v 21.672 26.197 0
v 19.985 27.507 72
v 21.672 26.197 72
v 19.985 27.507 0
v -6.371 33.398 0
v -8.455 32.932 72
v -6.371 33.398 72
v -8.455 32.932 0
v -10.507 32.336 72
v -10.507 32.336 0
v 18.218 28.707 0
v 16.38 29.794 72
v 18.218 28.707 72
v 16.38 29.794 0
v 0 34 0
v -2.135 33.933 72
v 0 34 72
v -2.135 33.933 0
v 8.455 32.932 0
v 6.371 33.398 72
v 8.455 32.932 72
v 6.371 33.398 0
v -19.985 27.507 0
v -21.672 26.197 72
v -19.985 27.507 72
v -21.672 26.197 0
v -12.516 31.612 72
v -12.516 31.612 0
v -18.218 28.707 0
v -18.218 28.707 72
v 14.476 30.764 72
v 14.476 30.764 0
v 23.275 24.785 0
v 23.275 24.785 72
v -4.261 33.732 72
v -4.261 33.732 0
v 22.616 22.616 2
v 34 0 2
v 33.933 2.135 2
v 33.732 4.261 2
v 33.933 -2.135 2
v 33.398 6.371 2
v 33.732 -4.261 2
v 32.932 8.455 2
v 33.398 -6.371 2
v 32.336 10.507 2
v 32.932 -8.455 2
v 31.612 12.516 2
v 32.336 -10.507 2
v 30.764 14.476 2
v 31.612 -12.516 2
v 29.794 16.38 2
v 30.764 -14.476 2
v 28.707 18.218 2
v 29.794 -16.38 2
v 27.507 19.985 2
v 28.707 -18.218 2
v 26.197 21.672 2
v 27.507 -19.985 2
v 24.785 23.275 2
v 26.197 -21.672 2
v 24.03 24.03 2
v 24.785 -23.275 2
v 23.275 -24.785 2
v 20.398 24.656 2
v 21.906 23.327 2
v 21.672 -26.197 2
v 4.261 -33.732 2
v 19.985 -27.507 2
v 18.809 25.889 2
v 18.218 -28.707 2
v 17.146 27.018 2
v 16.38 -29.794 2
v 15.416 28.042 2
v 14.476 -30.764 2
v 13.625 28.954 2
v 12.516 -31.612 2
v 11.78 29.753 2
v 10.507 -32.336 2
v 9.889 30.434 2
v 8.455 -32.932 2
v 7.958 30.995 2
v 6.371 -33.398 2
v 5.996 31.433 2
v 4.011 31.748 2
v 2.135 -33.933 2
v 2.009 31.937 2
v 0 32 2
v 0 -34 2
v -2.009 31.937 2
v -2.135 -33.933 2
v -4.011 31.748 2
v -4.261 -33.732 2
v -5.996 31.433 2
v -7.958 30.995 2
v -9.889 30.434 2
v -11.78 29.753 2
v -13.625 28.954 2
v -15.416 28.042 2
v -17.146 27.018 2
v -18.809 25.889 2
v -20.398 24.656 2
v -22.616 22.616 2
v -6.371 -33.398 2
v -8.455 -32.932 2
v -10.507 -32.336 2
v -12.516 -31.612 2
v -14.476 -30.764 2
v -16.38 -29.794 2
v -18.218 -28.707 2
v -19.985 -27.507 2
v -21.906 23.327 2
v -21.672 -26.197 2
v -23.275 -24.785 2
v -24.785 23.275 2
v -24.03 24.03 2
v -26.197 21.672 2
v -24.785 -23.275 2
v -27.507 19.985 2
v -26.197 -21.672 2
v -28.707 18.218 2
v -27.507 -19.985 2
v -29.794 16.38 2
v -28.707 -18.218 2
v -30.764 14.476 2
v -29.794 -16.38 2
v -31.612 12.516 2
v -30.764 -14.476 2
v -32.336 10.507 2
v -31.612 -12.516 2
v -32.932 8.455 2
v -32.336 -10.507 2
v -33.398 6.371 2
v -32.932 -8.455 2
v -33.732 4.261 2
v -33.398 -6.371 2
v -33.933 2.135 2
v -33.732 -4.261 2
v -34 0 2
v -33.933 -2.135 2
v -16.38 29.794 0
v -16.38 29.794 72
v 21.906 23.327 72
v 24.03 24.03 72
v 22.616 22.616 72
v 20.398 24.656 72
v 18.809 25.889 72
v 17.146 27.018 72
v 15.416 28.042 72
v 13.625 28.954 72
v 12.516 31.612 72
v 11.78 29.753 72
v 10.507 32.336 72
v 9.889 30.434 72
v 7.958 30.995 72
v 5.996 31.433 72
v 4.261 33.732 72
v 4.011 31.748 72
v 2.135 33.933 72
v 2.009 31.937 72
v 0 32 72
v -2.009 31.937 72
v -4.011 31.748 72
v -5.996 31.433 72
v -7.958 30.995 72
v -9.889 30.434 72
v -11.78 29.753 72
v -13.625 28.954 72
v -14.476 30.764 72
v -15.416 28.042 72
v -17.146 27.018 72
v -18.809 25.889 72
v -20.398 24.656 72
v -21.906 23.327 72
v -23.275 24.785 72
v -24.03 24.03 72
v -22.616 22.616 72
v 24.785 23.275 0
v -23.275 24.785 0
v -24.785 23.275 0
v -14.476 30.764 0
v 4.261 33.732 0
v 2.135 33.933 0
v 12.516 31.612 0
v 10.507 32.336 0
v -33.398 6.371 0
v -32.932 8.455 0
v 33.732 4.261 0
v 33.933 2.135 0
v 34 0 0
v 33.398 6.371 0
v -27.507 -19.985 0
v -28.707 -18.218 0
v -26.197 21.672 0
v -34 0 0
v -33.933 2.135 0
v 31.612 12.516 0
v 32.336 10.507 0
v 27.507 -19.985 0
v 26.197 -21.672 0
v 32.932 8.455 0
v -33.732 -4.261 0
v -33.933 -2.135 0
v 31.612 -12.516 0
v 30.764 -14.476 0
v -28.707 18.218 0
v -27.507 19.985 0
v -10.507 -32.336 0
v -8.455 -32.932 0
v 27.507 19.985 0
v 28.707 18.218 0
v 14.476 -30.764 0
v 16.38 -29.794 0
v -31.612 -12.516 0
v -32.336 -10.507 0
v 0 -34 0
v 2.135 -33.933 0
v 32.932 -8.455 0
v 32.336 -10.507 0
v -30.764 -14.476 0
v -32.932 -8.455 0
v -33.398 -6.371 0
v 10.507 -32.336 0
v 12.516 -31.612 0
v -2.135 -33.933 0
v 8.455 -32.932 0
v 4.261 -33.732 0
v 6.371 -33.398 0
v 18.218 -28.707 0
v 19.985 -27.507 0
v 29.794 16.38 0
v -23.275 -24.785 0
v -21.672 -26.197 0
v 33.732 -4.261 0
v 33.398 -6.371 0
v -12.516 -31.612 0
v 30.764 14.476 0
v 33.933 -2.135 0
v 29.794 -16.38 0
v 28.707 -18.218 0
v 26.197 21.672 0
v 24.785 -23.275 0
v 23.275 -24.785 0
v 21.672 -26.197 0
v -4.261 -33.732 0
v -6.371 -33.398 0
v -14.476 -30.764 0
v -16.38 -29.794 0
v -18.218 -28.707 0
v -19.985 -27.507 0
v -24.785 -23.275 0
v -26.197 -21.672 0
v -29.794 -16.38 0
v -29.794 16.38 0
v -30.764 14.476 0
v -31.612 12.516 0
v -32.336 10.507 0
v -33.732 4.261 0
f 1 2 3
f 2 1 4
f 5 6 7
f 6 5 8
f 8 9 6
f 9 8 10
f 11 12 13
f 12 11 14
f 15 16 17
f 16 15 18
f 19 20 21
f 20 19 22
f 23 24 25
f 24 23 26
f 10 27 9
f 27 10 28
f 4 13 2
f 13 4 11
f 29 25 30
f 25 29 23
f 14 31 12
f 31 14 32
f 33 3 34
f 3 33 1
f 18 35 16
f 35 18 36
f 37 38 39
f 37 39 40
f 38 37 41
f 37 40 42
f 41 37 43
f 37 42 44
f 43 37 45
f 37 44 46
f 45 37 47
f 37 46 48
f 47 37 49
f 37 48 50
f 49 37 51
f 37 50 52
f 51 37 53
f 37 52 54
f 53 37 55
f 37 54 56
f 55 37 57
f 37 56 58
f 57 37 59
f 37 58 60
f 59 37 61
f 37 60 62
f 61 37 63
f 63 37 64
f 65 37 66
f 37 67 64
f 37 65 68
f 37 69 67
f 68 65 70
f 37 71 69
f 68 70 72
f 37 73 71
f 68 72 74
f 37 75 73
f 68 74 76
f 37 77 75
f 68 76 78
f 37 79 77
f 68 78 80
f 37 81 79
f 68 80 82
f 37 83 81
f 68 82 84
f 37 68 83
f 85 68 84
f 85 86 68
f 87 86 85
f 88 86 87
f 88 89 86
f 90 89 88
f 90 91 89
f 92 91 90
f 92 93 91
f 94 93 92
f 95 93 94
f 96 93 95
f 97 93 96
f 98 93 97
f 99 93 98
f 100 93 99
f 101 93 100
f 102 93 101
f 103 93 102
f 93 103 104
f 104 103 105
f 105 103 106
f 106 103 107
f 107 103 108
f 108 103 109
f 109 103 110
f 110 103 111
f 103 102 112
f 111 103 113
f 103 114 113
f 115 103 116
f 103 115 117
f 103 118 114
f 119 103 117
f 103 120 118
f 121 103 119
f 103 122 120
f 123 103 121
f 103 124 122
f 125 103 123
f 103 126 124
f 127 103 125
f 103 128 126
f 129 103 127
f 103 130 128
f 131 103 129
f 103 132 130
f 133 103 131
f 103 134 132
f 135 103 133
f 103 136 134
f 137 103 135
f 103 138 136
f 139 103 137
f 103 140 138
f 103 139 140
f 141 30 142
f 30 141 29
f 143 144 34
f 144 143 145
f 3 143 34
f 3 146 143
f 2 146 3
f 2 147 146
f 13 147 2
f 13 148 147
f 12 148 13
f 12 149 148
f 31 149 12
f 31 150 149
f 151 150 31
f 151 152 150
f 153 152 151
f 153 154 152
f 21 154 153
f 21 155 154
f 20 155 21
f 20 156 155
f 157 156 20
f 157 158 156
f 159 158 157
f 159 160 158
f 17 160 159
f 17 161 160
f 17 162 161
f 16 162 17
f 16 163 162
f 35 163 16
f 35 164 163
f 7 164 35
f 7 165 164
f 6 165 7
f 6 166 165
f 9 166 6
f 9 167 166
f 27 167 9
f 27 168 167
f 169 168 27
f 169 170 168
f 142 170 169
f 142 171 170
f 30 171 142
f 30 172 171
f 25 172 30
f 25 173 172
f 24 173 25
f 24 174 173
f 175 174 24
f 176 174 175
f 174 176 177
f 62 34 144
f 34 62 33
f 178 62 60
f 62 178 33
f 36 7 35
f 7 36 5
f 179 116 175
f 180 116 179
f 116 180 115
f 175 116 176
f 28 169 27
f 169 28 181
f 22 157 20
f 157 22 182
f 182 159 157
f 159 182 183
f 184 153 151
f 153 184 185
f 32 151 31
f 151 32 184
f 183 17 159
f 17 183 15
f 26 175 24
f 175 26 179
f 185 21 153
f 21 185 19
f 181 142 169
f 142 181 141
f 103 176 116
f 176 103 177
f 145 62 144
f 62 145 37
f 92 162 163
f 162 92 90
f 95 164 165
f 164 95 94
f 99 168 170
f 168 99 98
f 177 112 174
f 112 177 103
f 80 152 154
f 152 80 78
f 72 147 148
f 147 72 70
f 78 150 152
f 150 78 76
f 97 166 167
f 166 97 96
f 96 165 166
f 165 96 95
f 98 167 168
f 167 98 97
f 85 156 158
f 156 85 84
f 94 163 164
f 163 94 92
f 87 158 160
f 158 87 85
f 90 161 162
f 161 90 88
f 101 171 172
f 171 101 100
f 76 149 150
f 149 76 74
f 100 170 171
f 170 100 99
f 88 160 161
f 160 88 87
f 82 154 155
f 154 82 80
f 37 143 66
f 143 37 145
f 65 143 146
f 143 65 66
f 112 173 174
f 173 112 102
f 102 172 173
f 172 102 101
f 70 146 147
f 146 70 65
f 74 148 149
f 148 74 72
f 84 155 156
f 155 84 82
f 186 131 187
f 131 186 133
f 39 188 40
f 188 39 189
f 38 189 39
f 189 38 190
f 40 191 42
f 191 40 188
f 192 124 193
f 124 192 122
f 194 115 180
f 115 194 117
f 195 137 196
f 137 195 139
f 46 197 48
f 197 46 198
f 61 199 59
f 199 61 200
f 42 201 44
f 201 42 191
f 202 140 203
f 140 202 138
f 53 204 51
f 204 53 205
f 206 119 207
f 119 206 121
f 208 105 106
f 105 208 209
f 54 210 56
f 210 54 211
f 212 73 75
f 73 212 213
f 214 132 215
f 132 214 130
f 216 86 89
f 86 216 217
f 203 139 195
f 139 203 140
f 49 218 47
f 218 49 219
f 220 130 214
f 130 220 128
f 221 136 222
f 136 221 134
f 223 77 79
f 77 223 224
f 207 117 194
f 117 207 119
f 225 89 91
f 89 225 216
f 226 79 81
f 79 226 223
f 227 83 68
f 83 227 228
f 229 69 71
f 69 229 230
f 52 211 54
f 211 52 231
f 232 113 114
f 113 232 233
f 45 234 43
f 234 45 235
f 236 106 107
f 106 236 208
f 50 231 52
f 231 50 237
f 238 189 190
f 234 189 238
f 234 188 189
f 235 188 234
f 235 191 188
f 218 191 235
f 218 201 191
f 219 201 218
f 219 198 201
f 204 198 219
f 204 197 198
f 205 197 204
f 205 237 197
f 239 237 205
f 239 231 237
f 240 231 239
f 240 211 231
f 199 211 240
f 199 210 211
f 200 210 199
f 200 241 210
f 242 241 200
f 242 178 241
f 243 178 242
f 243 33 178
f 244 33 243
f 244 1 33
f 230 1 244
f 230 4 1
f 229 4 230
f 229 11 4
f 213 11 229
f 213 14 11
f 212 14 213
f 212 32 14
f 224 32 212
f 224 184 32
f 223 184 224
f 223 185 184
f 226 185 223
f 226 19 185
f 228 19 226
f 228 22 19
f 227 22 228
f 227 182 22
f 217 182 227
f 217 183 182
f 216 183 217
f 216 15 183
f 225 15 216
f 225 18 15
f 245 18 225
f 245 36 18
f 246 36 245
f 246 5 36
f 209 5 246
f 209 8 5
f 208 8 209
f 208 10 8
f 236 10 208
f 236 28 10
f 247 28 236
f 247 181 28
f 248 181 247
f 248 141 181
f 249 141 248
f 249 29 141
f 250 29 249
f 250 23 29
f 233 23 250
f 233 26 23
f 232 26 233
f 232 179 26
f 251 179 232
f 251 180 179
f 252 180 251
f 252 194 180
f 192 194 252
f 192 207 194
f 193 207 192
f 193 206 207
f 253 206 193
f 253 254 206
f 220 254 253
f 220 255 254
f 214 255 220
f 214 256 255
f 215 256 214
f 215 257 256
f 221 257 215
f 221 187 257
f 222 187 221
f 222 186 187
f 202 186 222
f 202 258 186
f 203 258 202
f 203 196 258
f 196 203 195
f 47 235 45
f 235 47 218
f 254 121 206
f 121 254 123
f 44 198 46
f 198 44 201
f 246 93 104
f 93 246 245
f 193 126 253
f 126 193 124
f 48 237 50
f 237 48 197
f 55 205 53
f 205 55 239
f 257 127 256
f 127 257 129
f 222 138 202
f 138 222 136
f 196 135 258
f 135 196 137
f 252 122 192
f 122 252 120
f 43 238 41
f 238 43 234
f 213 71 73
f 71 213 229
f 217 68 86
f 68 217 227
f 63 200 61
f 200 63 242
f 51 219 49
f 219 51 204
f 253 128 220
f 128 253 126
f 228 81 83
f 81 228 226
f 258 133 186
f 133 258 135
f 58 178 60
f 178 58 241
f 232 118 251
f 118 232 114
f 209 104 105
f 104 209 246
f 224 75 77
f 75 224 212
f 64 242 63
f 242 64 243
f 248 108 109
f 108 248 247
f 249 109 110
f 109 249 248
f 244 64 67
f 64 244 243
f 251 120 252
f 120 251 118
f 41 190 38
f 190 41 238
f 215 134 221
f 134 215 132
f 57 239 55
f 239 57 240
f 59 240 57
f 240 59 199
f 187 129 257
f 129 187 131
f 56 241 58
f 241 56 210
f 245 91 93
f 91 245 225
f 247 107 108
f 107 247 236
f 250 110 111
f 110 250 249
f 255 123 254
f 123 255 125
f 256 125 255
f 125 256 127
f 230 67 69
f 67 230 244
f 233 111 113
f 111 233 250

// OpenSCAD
// Zylinder mit anpassbarem Öffnungswinkel, Höhe, Innendurchmesser, Wandstärke
// und einem soliden runden Deckel auf einer Seite mit separater Bodendicke
// Maße in mm

// Parameter
rinnenhoehe = 70;        // Höhe der Rinne (ohne Boden) - 226
bodendicke = 2;           // Dicke des Bodens
innendurchmesser = 64;    // Innendurchmesser
wandstaerke = 2;          // Wandstärke
gesamtoeffnungswinkel = 90;  // Gesamtöffnungswinkel (45° auf jeder Seite von der Mitte aus)

// Berechnung abgeleiteter Werte
innenradius = innendurchmesser / 2;
aussenradius = innenradius + wandstaerke;
start_winkel = 180 - gesamtoeffnungswinkel/2;  // Startwinkel für den Schnitt
end_winkel = start_winkel + (360 - gesamtoeffnungswinkel);  // Endwinkel für den Schnitt

module rinnen_segment(radius, hoehe) {
    difference() {
        cylinder(h = hoehe, r = radius, center = false, $fn = 100);
        // Segment herausschneiden basierend auf Startwinkel und Endwinkel
        rotate([0, 0, start_winkel])
            rotate_extrude(angle = end_winkel - start_winkel, $fn = 100)
                translate([0, 0, 0])
                    square([radius + 1, hoehe + 2]);
    }
}

union() {
    // Äußerer Teil der Rinne
    translate([0, 0, bodendicke]) {
        difference() {
            rinnen_segment(aussenradius, rinnenhoehe);
            rinnen_segment(innenradius, rinnenhoehe + 1); // Inneres Segment herausschneiden
        }
    }
    
    // Solider vollständiger runder Deckel auf einer Seite (bei z=0)
    cylinder(h = bodendicke, r = aussenradius, $fn = 100);
}
